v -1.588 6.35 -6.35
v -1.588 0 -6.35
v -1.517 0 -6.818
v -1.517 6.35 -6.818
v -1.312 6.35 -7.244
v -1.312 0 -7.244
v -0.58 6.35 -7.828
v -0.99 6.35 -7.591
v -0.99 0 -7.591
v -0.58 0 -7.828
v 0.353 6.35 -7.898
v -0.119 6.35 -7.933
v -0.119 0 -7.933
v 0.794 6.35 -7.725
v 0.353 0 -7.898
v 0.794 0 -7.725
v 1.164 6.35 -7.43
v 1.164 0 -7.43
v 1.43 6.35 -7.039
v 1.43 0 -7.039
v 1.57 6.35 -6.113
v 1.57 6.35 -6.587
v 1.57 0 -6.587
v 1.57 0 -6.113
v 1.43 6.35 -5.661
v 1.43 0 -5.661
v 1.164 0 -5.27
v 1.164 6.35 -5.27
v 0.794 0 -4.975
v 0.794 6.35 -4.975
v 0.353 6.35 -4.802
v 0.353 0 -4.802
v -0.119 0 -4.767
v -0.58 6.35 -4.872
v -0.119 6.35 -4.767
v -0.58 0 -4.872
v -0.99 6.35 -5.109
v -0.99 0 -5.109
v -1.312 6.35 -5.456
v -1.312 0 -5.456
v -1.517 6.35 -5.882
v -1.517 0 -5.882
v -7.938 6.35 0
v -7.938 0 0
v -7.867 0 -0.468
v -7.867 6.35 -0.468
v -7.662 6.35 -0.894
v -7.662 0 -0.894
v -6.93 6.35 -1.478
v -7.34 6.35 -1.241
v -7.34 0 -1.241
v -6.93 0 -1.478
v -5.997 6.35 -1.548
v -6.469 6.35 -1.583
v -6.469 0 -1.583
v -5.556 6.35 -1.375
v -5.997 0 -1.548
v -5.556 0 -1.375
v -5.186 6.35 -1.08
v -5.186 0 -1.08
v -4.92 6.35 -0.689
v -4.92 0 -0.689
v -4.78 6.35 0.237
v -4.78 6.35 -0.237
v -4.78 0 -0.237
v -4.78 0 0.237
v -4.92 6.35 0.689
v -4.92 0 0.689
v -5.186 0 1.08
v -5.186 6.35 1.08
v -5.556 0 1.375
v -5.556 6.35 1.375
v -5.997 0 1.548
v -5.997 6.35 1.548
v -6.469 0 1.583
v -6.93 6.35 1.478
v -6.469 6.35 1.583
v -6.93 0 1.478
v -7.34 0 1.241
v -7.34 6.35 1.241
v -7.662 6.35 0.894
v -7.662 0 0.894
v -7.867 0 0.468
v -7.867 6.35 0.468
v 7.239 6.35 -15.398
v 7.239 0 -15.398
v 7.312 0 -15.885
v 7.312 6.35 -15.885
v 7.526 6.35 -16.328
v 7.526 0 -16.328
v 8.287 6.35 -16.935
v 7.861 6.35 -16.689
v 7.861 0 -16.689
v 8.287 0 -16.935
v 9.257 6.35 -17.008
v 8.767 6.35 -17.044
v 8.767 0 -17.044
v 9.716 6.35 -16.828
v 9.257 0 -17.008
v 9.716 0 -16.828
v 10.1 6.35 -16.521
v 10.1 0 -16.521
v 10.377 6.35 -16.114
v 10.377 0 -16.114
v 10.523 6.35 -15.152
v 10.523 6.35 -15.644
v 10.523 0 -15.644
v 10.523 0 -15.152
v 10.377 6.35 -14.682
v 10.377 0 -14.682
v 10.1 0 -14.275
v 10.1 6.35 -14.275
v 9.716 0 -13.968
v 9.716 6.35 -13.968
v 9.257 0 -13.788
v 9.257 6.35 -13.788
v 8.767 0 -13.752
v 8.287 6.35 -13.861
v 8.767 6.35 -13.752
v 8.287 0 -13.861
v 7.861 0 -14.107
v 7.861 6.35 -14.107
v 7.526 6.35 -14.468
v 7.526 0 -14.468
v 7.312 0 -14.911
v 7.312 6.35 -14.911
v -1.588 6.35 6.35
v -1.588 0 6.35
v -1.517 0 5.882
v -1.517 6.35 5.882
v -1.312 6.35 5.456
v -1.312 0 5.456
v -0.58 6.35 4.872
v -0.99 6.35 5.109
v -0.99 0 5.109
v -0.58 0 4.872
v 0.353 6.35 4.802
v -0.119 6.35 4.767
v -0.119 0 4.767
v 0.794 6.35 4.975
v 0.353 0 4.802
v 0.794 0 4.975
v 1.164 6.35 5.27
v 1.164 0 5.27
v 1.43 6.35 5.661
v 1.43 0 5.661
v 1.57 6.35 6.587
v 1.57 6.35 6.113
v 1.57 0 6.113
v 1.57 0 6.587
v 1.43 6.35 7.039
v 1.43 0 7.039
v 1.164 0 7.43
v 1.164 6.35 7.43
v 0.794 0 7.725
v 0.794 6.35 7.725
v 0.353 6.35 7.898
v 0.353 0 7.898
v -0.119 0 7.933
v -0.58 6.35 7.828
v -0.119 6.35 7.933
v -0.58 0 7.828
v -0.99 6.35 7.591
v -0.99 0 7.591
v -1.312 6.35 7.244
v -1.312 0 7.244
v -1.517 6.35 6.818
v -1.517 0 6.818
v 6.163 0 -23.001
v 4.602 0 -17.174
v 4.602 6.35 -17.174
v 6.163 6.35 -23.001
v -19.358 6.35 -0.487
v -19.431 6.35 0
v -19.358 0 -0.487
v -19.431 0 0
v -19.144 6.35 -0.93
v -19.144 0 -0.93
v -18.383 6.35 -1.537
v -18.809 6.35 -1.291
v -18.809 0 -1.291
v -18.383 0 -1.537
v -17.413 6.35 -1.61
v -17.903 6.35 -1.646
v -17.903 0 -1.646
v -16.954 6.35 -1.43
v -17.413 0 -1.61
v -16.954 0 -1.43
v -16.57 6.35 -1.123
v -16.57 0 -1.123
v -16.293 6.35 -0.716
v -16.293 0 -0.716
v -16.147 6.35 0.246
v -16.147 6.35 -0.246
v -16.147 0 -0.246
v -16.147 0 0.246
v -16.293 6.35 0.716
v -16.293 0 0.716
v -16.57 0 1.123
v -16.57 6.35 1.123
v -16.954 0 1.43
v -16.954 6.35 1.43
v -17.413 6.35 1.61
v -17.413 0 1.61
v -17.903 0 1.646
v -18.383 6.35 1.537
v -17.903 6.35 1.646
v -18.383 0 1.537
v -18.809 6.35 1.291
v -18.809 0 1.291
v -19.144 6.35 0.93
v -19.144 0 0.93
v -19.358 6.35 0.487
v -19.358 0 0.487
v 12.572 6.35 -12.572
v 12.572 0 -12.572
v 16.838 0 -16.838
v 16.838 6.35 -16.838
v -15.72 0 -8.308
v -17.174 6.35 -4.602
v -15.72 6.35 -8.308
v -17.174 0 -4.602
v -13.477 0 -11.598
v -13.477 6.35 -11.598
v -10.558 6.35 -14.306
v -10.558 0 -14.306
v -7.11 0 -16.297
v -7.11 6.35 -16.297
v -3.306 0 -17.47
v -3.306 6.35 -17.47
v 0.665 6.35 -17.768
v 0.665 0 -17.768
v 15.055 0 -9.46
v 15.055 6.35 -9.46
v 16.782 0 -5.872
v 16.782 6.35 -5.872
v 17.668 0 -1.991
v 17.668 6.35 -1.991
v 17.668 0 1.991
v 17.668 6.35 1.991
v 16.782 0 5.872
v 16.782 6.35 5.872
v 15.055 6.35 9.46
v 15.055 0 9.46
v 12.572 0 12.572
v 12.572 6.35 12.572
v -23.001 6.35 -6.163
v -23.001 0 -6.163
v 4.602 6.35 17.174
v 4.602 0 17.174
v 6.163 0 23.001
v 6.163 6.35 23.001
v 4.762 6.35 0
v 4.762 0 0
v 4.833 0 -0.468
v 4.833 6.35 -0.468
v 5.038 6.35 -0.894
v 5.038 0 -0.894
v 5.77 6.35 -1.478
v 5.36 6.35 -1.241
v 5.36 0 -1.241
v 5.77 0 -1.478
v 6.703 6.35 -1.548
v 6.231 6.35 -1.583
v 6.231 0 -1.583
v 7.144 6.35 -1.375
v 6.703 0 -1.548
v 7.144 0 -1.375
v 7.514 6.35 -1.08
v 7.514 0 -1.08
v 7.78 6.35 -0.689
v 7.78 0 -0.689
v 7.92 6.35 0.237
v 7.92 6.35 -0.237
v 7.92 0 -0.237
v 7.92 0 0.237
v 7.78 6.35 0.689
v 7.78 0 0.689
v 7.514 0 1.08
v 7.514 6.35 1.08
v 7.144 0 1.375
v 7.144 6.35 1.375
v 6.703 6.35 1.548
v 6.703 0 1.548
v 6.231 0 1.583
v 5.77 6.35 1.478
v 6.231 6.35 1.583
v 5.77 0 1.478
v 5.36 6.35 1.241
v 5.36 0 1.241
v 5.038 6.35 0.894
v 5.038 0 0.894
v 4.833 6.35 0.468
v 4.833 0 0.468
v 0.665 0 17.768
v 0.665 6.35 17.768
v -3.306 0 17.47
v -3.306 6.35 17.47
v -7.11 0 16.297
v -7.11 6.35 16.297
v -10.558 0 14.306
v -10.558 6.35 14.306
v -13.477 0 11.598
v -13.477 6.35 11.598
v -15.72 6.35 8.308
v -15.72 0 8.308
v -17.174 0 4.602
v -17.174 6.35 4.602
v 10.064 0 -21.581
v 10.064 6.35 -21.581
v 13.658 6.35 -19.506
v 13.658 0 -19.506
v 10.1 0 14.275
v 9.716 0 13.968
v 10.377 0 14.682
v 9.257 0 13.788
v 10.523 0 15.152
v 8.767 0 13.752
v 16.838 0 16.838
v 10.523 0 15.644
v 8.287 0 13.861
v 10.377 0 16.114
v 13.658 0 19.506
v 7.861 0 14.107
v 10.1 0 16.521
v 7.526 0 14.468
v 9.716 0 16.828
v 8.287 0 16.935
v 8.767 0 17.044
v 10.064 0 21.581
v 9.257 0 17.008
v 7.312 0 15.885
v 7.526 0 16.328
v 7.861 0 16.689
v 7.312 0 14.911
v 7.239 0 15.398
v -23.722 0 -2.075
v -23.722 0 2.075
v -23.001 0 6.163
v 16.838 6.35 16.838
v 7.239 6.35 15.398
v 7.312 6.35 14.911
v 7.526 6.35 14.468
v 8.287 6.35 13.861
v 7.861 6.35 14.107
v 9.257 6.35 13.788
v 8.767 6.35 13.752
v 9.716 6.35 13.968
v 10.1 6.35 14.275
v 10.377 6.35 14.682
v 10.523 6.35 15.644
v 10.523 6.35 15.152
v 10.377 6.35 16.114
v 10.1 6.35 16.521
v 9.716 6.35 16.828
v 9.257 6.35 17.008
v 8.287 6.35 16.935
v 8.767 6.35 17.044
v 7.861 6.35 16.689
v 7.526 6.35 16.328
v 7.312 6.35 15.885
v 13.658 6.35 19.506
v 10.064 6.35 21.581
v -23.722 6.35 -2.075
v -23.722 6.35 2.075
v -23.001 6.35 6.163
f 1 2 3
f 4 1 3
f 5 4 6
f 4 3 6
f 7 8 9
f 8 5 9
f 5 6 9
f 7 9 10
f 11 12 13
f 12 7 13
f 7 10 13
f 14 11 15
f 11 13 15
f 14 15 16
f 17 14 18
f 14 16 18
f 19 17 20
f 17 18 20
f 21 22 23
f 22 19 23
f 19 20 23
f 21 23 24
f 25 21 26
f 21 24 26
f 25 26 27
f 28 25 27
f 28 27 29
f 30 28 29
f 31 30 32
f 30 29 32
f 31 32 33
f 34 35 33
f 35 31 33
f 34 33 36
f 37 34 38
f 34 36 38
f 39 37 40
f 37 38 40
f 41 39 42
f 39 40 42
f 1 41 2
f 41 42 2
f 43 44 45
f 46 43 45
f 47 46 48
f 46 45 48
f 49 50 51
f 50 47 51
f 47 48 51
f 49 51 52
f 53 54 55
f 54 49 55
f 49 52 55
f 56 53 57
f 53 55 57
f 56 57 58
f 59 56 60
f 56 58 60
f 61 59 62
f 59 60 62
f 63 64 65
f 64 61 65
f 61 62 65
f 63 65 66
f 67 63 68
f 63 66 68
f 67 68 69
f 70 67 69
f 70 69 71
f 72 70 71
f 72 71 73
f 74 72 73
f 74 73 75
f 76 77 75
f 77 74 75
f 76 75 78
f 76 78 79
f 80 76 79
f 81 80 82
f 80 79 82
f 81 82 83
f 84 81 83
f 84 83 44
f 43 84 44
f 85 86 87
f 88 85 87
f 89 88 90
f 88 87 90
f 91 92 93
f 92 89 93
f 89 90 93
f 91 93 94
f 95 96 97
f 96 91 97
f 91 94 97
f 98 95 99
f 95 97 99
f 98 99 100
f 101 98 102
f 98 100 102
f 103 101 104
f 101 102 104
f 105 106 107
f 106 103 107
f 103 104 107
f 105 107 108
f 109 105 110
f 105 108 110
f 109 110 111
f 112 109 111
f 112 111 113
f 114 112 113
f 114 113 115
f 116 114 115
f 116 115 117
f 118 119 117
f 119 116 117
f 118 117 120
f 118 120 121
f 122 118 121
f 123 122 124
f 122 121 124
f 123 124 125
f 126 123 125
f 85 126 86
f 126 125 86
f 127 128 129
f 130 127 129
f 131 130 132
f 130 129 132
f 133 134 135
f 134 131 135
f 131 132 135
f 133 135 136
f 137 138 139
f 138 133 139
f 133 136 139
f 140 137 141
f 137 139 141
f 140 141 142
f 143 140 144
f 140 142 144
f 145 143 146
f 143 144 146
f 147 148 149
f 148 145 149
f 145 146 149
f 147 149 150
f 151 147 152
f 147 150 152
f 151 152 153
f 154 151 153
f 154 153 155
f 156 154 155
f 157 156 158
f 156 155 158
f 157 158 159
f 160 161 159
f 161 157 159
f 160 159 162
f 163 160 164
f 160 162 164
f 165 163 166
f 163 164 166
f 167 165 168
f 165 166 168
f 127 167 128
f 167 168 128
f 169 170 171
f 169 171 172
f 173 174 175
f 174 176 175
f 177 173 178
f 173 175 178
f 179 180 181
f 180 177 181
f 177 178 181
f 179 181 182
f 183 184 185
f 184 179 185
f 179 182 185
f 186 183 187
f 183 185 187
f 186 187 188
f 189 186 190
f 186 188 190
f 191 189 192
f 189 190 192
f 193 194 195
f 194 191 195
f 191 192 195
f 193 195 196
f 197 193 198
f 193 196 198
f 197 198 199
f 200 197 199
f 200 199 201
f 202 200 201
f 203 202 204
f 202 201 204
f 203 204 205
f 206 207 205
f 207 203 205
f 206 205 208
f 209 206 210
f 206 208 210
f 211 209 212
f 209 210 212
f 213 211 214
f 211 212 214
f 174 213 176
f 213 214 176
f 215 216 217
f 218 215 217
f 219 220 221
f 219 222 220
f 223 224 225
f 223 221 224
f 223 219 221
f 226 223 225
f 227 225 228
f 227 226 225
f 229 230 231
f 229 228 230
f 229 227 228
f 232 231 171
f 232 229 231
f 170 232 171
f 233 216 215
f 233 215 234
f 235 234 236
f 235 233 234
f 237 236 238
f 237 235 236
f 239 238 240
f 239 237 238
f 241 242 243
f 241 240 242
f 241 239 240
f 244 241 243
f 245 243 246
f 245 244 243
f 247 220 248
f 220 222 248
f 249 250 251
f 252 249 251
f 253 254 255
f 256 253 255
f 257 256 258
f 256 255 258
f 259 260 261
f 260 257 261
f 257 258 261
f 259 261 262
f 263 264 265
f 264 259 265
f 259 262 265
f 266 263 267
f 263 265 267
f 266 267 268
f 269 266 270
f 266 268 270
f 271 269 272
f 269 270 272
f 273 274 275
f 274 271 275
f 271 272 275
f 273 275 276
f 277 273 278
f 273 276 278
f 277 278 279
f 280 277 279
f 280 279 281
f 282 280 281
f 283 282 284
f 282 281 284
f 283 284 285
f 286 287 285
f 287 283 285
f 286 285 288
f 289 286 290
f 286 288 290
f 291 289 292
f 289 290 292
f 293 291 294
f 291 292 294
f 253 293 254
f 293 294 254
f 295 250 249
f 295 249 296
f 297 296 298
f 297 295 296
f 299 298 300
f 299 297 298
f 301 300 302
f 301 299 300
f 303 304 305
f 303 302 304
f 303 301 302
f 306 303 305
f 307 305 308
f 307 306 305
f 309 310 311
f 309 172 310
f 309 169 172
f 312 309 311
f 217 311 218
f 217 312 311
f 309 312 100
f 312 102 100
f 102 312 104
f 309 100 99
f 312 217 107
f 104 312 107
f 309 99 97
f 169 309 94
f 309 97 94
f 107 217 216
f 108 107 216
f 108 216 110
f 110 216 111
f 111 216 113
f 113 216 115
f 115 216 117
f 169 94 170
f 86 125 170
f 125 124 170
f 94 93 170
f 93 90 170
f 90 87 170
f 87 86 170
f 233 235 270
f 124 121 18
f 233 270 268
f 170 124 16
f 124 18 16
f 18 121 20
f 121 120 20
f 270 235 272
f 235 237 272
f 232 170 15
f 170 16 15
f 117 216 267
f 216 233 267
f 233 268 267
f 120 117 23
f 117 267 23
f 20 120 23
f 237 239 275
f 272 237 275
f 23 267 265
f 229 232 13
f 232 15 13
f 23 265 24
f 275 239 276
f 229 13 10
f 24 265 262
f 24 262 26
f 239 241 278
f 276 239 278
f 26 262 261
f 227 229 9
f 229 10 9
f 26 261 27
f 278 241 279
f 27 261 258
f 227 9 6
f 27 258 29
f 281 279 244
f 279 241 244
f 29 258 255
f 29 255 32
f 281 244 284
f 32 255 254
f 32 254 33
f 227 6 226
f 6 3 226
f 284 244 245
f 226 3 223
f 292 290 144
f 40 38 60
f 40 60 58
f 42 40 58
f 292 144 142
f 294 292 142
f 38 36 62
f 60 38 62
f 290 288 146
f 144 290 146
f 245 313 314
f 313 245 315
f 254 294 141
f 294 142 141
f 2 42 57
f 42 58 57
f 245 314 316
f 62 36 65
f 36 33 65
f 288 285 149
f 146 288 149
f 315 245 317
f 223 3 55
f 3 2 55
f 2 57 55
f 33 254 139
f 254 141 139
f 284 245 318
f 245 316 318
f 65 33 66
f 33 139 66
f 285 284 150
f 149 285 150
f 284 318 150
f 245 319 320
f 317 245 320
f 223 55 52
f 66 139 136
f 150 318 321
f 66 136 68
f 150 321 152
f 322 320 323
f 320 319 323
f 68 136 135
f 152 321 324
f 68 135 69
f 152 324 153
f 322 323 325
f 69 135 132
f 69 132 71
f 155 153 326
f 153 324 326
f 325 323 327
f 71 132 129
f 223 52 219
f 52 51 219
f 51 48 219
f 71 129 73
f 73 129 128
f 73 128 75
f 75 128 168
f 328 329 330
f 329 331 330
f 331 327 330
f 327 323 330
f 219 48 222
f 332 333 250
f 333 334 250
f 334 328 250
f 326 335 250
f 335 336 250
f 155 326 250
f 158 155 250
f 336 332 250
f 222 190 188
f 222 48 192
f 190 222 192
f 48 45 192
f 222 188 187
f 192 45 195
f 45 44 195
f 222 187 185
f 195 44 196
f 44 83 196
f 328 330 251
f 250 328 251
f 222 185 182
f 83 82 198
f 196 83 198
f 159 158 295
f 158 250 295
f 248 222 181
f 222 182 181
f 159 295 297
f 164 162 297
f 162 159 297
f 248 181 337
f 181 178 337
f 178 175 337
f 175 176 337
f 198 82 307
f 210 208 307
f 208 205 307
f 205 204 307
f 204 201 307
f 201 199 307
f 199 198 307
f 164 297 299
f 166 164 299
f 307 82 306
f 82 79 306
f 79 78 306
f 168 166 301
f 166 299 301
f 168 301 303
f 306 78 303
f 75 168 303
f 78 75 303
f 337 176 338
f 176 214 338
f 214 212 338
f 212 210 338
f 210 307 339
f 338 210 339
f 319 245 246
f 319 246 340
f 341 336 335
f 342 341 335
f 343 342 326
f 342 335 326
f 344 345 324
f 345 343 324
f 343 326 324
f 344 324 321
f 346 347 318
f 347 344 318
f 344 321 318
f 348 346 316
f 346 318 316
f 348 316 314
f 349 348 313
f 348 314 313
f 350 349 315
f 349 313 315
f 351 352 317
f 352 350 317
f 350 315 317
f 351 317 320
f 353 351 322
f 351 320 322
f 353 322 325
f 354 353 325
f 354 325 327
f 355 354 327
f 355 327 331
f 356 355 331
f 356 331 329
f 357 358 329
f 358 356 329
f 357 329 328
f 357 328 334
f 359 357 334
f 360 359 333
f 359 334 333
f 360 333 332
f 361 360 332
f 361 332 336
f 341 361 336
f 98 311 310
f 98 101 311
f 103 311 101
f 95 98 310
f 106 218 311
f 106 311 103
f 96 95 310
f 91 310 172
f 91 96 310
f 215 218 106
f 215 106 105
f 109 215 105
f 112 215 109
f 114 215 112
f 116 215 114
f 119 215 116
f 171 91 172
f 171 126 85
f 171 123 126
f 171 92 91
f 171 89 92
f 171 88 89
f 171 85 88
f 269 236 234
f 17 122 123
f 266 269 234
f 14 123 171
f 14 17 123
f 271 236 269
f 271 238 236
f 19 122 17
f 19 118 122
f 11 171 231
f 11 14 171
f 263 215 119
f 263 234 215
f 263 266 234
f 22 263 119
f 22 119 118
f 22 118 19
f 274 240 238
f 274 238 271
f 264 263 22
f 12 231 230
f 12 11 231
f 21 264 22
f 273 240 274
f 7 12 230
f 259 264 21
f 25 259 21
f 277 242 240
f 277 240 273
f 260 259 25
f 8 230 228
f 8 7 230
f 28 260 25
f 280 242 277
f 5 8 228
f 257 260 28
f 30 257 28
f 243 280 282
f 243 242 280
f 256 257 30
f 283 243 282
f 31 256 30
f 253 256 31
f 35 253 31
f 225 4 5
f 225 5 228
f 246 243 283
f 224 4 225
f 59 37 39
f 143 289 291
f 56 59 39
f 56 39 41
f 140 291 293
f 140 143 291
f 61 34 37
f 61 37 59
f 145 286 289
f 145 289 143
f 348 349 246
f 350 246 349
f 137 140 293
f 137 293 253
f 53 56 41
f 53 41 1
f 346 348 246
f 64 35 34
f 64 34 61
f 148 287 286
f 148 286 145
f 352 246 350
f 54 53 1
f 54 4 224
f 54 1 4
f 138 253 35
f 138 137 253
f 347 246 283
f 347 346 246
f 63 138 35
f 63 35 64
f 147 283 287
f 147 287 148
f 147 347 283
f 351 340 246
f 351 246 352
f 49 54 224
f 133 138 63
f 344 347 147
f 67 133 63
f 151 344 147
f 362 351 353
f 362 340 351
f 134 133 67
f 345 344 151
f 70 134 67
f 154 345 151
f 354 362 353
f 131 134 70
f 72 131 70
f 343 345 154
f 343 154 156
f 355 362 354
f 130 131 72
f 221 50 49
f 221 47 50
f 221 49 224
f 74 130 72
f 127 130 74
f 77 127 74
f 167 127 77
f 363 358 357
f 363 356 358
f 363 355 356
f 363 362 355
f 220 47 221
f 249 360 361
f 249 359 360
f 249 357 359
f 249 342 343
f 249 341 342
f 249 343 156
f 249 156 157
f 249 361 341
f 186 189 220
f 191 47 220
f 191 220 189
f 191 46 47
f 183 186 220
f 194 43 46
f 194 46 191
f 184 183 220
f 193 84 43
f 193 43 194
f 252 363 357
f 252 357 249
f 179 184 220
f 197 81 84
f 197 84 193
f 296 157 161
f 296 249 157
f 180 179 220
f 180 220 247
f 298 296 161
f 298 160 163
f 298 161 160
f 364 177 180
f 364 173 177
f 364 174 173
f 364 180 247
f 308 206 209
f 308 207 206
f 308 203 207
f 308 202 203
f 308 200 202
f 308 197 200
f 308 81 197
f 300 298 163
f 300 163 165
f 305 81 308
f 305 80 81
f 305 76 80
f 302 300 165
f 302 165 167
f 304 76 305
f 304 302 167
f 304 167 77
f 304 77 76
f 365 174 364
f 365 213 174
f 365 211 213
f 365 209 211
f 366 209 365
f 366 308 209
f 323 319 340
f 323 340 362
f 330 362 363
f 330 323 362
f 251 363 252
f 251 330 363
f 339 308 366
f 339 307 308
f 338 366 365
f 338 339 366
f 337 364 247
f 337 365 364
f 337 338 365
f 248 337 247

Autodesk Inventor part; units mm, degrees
ref_plane "YZ Plane" through (0, 0, 0) normal (1, 0, 0) x (0, 1, 0)
ref_plane "XZ Plane" through (0, 0, 0) normal (0, 1, 0) x (-1, 0, 0)
ref_plane "XY Plane" through (0, 0, 0) normal (0, 0, 1) x (1, 0, 0)
sketch "Sketch1" plane through (0, 0, 0) normal (0, 1, 0) x (-1, 0, 0)
  line L0 (17.1742, 4.6018) -> (23.0011, 6.1631)
  line L1 (17.1742, -4.6018) -> (23.0011, -6.1631)
  circle A0 centre (17.78, 0) radius 1.651
  line L2 (-12.5724, 12.5724) -> (-16.838, 16.838)
  line L3 (-4.6018, 17.1742) -> (-6.1631, 23.0011)
  circle A1 centre (-8.89, 15.3979) radius 1.651
  line L4 (-4.6018, -17.1742) -> (-6.1631, -23.0011)
  line L5 (-12.5724, -12.5724) -> (-16.838, -16.838)
  circle A2 centre (-8.89, -15.3979) radius 1.651
  arc A3 (-6.1631, 23.0011) -> (-16.838, 16.838) centre (0, 0) ccw
  arc A4 (-16.838, -16.838) -> (-6.1631, -23.0011) centre (0, 0) ccw
  arc A5 (23.0011, -6.1631) -> (23.0011, 6.1631) centre (0, 0) ccw
  arc A6 (-12.5724, 12.5724) -> (-12.5724, -12.5724) centre (0, 0) ccw
  arc A7 (-4.6018, -17.1742) -> (17.1742, -4.6018) centre (0, 0) ccw
  arc A8 (17.1742, 4.6018) -> (-4.6018, 17.1742) centre (0, 0) ccw
  circle A9 centre (6.35, 0) radius 1.5875
  circle A10 centre (0, 6.35) radius 1.5875
  circle A11 centre (-6.35, 0) radius 1.5875
  circle A12 centre (0, -6.35) radius 1.5875
  dimension "d3" = 3.302
  dimension "d9" = 3.175
  dimension "d12" = 360
  dimension "d15" = 6.35
extrude "Extrusion1" add sketch "Sketch1" along normal blind 6.35
properties part number "Hub_Adapter_Acryllic"
